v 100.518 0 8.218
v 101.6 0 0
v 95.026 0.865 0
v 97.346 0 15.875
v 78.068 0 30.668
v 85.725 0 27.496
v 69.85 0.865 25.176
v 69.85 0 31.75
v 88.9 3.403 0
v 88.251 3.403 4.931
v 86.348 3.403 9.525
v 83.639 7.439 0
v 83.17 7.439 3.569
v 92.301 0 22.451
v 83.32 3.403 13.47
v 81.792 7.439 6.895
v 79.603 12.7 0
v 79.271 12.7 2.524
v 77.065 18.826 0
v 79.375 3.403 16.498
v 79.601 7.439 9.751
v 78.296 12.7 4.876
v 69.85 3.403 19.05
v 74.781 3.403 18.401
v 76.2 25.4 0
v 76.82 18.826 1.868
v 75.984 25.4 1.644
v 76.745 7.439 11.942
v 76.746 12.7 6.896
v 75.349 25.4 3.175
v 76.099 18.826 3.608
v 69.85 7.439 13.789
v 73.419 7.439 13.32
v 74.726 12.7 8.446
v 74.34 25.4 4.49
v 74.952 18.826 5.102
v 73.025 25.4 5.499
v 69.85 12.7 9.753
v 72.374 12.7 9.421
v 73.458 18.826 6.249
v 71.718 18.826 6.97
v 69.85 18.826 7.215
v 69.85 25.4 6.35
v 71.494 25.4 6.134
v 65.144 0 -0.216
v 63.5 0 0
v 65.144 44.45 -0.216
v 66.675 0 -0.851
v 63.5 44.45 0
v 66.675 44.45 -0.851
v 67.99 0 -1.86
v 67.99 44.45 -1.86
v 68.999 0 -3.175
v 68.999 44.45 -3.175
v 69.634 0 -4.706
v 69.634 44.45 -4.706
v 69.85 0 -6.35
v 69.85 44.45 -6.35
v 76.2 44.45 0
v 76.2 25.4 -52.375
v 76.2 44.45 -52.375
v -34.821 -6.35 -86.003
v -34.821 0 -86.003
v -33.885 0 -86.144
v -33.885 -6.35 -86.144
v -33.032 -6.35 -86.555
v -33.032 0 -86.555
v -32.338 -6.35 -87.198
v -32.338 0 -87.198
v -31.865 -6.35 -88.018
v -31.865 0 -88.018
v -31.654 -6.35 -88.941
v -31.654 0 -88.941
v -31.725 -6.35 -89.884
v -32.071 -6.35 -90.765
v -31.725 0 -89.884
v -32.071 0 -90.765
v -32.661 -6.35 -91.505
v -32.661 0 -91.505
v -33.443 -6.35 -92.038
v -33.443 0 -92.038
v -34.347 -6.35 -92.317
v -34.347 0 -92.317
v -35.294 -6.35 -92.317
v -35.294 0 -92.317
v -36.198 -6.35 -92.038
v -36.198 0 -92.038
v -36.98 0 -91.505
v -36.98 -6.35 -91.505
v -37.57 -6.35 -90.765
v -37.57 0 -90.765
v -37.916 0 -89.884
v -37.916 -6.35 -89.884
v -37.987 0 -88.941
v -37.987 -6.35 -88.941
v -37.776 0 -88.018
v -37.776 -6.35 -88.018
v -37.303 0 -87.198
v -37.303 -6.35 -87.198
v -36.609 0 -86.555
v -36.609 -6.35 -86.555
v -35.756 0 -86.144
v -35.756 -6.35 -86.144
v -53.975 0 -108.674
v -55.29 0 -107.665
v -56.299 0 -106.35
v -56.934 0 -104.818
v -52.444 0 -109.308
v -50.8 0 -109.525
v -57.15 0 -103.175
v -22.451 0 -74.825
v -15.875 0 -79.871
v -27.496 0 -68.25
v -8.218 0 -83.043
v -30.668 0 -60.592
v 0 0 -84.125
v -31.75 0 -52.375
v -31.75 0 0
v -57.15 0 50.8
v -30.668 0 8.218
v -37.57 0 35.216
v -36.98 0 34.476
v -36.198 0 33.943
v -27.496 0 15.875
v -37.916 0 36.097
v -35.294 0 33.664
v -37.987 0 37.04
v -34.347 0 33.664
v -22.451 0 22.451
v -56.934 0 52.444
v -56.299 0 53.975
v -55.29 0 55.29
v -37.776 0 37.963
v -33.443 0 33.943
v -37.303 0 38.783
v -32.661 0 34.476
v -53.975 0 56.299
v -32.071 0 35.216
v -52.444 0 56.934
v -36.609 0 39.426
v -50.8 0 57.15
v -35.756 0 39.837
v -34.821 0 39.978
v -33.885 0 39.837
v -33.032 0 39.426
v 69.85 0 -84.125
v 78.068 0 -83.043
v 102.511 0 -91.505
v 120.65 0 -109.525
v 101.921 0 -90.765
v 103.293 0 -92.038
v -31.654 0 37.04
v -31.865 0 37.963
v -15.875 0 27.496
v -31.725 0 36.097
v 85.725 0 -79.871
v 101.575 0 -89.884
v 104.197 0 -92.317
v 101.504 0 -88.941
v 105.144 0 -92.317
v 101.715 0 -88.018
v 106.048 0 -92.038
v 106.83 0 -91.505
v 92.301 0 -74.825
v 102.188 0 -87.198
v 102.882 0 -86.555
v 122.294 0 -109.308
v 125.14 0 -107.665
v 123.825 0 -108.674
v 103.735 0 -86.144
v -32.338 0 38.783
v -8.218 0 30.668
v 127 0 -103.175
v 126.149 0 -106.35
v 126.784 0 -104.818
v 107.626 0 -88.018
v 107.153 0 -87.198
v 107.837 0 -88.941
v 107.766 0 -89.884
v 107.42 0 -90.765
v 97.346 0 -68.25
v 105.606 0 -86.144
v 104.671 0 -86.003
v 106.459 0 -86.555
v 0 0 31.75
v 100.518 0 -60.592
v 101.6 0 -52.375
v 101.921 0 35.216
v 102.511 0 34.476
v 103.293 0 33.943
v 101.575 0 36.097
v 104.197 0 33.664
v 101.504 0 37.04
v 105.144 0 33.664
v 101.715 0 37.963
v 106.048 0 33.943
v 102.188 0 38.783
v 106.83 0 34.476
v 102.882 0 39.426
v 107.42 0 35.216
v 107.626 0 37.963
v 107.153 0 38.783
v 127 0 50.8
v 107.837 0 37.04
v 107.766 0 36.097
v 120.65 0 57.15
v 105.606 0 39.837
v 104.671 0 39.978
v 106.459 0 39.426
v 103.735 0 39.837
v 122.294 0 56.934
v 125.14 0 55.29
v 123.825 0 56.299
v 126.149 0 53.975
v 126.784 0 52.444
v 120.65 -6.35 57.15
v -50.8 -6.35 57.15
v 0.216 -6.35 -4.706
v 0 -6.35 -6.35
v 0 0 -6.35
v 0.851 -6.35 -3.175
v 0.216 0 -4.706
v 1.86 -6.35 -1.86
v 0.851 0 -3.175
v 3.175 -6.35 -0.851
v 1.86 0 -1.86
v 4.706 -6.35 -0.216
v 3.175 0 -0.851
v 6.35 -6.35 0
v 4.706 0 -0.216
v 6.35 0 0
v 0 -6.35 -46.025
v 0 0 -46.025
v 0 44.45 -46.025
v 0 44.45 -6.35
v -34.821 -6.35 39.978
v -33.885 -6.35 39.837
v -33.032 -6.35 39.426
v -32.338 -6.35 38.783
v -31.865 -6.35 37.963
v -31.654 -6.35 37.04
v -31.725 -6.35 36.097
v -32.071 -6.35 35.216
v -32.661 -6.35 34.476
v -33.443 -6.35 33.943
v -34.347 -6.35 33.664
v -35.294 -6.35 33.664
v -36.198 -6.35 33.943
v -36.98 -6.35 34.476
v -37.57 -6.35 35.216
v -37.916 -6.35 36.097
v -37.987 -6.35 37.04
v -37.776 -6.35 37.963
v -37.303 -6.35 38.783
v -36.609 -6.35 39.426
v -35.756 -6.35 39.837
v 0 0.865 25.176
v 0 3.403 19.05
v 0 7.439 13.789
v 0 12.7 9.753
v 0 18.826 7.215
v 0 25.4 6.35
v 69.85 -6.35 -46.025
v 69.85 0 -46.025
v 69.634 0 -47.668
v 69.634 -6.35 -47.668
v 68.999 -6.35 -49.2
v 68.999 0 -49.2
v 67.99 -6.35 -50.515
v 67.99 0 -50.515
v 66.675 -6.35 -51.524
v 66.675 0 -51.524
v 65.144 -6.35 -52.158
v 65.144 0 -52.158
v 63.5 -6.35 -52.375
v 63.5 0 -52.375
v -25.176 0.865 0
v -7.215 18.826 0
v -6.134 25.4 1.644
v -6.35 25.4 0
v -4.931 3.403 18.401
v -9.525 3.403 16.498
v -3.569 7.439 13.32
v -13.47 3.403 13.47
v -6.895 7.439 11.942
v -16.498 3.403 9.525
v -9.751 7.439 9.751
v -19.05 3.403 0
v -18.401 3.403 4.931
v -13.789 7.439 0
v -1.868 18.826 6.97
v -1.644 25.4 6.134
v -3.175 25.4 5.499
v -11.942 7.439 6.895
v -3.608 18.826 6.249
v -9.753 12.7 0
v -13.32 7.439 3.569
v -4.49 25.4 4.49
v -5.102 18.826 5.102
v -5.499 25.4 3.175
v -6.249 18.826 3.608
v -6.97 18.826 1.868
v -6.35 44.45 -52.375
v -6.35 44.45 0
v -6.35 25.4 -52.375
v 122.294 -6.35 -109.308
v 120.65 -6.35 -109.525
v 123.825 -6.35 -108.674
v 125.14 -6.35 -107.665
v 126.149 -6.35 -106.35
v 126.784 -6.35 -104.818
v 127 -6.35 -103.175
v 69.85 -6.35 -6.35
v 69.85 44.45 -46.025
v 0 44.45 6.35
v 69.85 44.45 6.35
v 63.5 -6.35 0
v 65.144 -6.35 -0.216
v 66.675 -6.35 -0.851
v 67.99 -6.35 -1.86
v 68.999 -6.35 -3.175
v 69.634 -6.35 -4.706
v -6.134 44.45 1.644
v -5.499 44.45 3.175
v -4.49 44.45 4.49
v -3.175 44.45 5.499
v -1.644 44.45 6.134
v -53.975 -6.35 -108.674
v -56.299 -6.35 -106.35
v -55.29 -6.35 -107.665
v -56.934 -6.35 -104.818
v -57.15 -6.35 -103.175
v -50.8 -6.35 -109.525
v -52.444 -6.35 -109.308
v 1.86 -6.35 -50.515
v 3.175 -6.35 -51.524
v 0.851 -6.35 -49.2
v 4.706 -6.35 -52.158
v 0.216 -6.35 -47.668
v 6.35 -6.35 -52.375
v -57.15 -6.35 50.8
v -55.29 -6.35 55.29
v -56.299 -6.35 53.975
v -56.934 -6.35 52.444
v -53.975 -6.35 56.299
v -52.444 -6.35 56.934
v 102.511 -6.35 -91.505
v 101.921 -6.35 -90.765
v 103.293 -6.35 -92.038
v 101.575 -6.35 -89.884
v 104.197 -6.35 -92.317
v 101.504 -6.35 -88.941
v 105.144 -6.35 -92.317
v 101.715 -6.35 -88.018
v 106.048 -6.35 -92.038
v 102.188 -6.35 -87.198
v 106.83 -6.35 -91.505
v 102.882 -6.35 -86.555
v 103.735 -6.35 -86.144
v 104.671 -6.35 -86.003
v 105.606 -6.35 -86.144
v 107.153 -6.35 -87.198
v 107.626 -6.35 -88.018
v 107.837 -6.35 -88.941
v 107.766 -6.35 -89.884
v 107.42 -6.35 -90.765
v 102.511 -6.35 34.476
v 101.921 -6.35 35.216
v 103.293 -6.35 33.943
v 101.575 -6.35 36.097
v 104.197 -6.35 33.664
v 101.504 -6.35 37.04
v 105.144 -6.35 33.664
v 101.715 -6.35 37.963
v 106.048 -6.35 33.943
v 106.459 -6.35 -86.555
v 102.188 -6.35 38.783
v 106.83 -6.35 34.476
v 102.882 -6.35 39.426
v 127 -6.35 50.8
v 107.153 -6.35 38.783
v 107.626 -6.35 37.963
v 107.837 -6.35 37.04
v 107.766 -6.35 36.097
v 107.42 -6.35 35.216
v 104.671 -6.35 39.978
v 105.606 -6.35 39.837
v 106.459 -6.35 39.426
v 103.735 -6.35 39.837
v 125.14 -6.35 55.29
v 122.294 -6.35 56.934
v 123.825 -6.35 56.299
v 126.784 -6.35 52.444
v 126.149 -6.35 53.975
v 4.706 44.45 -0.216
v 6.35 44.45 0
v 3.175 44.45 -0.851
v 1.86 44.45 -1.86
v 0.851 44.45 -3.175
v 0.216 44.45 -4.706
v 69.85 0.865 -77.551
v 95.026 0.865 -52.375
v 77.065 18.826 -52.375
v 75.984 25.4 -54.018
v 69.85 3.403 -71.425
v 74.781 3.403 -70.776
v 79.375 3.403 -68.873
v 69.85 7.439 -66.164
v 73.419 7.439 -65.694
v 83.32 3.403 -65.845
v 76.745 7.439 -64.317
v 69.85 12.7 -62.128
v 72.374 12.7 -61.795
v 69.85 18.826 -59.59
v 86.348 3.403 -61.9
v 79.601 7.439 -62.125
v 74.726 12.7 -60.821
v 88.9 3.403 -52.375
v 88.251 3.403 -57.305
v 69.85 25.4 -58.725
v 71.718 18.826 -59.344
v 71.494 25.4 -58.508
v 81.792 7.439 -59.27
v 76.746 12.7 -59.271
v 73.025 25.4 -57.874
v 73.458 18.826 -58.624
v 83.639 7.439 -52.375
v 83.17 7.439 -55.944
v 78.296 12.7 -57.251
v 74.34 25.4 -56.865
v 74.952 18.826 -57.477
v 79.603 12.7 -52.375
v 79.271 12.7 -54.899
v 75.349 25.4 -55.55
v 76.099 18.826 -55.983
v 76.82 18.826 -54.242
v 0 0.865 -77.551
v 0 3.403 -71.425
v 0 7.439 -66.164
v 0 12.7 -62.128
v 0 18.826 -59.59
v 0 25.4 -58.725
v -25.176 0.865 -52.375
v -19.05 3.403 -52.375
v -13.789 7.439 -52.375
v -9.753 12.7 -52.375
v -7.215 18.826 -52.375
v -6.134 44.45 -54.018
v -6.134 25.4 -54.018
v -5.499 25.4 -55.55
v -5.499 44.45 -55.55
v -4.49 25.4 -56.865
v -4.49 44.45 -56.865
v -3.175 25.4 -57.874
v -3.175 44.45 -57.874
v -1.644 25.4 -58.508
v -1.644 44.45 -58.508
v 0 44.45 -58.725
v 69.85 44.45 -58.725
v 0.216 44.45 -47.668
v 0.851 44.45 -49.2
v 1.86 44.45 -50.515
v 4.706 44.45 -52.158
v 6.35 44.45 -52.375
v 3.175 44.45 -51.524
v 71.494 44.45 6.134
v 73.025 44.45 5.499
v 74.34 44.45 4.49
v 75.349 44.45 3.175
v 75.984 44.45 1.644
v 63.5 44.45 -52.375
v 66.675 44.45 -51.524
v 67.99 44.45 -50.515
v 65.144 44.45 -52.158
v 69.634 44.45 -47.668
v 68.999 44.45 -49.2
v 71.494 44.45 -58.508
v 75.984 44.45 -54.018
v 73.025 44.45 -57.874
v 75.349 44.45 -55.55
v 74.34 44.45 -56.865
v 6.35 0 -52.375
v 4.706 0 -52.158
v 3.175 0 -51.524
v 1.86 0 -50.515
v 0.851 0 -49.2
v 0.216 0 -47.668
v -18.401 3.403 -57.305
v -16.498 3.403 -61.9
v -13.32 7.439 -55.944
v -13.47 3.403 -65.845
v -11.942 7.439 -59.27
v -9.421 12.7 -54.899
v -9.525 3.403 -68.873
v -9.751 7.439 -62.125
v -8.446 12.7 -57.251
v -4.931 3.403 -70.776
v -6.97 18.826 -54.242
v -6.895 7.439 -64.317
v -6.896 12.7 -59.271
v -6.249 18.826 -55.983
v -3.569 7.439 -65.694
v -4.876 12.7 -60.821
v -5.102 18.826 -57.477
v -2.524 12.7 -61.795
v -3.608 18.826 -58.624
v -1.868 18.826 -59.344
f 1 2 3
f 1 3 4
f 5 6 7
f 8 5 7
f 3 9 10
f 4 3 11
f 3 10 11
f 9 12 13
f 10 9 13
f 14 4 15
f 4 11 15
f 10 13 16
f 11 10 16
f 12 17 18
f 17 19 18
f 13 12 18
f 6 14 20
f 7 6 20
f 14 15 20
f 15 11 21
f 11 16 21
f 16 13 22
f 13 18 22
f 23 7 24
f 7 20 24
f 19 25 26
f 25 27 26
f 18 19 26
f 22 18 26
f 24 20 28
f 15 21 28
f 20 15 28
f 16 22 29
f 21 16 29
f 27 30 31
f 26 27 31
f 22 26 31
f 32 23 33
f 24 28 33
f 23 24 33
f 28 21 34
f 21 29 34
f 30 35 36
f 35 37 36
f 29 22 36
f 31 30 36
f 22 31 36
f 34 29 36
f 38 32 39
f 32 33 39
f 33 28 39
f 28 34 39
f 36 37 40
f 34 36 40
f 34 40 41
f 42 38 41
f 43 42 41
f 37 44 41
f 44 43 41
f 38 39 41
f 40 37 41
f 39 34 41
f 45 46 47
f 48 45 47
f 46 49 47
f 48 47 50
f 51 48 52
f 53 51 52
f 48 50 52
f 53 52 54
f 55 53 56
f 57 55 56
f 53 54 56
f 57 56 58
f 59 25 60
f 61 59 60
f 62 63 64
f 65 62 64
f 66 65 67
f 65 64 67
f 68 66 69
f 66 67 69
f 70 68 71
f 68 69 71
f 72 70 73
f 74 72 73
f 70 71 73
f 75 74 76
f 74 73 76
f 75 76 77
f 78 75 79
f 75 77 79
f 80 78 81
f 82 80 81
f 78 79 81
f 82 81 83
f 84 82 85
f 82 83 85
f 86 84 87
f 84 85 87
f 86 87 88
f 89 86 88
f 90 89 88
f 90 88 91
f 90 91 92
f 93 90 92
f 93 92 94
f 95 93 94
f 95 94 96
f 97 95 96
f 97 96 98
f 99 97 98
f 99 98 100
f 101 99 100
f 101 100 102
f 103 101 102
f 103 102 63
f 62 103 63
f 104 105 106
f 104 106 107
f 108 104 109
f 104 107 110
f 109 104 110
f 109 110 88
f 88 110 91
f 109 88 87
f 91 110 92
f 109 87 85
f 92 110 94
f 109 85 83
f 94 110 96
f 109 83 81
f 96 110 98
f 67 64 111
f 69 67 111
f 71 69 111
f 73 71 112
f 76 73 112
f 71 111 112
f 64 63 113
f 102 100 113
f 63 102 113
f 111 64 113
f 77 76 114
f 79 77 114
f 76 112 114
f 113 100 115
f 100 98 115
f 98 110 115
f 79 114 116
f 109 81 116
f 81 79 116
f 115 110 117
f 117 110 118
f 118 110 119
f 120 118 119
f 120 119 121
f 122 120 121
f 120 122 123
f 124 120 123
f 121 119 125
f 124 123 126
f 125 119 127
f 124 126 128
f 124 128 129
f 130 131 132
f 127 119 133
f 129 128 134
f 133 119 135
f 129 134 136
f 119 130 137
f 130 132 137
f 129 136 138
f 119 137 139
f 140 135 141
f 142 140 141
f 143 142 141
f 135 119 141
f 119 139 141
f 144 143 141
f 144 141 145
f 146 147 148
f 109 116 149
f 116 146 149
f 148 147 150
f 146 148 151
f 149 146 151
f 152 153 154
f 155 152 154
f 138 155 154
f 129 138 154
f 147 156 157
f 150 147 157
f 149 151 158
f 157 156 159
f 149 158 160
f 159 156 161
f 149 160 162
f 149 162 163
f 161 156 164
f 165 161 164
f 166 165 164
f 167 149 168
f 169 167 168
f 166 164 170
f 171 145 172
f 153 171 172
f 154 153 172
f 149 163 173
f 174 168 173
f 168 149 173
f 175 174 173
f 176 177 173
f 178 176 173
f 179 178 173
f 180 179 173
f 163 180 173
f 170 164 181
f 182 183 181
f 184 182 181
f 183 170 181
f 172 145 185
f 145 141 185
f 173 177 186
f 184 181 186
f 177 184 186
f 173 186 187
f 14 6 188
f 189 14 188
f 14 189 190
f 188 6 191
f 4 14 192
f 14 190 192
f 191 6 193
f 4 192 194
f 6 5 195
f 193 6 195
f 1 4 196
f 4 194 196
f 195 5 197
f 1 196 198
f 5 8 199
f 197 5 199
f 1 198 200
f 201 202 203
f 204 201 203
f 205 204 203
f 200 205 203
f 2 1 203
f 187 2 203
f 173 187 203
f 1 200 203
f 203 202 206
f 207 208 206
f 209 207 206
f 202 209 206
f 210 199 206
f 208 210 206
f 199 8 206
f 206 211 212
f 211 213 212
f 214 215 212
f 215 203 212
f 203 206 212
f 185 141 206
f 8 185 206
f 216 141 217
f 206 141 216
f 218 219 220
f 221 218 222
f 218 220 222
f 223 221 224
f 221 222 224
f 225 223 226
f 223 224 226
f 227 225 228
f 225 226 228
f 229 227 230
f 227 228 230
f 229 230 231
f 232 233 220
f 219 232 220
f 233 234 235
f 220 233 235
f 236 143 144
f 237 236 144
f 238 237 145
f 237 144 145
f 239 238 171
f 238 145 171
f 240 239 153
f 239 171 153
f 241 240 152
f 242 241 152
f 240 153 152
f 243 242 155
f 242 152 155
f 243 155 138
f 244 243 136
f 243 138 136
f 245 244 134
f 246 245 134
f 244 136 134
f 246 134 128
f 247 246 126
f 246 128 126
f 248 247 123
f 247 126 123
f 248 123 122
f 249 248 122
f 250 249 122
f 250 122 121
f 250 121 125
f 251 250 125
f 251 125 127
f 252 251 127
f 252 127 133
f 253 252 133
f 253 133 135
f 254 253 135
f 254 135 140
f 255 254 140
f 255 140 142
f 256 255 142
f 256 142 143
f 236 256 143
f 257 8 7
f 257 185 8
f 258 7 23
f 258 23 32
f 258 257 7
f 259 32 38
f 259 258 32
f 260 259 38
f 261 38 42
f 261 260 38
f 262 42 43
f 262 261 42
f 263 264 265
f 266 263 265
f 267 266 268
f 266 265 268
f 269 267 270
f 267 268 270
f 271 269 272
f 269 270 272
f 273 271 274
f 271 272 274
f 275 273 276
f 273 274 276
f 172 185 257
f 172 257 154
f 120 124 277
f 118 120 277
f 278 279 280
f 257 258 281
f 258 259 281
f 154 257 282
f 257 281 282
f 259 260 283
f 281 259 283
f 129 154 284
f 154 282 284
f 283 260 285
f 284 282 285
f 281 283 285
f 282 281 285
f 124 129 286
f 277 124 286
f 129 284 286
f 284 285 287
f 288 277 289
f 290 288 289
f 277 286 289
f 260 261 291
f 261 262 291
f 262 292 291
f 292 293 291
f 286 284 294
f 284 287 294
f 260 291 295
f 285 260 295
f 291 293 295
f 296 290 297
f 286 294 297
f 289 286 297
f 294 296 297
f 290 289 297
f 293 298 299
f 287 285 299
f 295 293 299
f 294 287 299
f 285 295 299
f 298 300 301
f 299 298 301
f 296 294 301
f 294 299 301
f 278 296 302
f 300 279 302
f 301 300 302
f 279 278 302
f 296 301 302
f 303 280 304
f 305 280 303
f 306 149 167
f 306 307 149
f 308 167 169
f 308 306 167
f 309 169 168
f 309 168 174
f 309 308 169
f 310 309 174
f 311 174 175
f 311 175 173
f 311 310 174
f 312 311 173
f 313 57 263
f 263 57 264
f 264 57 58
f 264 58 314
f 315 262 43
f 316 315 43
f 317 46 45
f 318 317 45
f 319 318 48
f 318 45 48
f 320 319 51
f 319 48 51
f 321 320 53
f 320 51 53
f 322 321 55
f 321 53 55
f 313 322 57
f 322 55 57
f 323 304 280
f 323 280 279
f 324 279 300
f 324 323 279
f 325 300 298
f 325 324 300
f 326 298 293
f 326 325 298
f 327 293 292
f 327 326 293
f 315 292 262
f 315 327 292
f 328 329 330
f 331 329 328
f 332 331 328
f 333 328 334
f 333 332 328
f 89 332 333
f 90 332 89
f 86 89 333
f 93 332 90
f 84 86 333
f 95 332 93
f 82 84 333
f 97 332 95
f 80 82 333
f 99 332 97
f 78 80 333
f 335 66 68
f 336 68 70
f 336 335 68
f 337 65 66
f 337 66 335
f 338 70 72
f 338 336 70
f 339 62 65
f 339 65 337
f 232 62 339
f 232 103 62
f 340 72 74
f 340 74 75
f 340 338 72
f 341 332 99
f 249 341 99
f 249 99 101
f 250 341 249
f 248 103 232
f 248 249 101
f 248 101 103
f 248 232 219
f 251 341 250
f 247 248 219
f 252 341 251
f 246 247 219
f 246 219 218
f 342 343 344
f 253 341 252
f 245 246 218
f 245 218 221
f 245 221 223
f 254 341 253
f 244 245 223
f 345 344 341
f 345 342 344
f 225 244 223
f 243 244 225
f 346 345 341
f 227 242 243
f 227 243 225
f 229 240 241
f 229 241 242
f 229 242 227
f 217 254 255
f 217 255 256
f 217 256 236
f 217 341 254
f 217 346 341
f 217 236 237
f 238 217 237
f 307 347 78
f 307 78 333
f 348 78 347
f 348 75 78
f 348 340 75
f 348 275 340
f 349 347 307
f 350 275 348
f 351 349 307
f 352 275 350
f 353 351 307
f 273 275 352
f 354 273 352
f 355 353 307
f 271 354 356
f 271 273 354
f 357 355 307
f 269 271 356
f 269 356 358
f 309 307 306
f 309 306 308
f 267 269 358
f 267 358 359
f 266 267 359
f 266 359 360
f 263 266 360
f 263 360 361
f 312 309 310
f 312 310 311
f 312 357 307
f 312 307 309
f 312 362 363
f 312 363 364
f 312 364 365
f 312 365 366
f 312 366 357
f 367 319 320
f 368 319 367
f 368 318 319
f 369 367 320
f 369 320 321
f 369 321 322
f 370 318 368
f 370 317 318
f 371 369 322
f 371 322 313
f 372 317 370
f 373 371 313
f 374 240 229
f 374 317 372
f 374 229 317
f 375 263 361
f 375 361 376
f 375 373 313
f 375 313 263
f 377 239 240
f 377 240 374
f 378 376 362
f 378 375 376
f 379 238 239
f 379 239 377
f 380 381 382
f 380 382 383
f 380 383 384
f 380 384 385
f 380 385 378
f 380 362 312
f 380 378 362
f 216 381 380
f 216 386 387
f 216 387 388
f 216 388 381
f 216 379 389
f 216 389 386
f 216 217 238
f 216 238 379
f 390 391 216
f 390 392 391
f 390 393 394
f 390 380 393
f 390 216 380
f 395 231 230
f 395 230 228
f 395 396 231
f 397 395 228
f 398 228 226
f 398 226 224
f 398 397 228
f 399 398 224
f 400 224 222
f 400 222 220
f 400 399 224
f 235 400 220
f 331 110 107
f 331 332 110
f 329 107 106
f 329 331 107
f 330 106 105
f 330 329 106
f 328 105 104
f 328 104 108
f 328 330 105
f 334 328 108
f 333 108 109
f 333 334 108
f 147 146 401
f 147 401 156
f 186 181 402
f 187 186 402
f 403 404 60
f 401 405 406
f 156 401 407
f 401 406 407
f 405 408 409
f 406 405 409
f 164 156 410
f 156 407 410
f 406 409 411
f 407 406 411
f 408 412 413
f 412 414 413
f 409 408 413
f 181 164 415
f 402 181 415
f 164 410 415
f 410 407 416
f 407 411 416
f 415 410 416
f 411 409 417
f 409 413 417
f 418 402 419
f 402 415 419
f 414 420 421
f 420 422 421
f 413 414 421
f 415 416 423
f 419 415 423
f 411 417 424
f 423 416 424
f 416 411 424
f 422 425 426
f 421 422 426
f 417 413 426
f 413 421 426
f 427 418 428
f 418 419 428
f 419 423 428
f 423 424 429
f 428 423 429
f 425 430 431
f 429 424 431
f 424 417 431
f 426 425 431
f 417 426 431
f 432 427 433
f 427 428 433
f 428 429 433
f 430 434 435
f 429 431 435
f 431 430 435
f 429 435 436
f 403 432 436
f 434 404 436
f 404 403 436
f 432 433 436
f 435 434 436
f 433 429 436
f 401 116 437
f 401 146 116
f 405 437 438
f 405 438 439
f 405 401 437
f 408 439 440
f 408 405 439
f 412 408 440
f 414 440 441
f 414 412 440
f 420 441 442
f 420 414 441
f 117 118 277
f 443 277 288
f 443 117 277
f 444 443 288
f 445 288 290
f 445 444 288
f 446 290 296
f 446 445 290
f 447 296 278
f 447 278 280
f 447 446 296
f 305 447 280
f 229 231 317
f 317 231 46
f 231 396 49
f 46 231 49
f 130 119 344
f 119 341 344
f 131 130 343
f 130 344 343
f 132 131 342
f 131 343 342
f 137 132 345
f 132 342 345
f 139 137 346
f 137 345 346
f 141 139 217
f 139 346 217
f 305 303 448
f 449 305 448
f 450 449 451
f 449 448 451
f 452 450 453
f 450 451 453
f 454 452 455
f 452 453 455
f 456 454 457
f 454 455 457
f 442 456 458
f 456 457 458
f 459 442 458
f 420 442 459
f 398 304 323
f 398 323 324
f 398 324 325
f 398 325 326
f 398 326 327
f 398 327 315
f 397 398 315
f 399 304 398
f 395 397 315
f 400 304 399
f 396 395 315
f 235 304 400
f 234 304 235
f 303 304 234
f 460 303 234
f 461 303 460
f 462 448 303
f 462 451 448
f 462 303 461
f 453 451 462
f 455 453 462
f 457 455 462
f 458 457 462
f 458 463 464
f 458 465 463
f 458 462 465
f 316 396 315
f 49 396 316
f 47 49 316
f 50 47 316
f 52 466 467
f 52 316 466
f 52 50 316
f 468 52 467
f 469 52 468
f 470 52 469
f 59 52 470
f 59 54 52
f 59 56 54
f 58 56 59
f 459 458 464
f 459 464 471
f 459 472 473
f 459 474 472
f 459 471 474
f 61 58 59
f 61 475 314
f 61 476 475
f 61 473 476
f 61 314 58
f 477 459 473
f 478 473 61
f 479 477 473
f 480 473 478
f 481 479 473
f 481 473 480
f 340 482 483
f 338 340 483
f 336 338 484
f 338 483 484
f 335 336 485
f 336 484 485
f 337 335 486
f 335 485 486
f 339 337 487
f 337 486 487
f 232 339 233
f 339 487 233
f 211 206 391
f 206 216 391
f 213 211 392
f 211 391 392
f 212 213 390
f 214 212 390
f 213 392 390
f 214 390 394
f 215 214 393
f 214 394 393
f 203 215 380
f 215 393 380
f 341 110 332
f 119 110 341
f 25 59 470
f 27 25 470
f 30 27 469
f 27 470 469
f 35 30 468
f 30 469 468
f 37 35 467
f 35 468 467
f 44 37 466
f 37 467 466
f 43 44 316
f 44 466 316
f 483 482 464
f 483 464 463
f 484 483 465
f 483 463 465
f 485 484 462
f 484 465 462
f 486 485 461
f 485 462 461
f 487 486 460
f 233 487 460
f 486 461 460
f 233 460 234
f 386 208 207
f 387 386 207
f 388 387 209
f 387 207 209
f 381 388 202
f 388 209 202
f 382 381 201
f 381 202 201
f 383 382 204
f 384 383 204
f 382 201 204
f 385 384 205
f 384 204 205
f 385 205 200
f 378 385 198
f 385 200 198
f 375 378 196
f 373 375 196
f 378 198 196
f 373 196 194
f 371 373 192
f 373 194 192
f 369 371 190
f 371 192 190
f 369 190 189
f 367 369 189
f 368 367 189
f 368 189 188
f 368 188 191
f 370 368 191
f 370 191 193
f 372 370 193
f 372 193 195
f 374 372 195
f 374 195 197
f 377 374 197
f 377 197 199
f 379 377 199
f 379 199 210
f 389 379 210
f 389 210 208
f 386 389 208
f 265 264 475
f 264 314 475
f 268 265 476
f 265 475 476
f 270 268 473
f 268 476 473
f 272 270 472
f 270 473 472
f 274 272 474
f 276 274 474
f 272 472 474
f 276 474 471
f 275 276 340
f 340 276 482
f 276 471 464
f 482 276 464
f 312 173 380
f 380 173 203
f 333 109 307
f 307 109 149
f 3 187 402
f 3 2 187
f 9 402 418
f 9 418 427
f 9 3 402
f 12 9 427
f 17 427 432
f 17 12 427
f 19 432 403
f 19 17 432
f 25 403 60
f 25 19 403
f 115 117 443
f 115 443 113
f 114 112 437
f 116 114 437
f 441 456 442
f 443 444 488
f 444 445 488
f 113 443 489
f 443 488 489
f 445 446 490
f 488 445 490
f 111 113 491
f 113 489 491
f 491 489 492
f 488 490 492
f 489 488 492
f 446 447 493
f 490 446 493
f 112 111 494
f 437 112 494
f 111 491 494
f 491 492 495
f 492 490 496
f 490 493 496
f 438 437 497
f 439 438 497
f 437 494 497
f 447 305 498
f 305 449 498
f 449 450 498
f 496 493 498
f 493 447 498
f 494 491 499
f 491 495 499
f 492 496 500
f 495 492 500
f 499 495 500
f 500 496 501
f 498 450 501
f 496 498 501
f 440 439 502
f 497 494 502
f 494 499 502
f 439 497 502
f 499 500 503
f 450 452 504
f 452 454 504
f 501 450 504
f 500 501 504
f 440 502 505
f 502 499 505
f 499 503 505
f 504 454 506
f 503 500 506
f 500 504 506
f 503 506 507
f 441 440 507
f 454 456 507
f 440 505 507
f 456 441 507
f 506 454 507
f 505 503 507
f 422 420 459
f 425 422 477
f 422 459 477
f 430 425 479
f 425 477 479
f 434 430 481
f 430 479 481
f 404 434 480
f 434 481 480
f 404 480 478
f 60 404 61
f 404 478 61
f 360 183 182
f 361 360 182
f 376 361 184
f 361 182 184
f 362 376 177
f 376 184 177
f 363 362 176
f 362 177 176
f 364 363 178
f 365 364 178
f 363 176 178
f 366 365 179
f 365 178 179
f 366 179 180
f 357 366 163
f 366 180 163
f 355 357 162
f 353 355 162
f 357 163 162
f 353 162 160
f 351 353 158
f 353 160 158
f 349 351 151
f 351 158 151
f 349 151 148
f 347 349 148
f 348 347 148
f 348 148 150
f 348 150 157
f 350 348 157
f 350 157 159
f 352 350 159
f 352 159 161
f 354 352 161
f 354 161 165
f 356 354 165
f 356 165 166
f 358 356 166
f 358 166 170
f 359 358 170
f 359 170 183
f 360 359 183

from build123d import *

# Parameters (mm, degrees)
SKETCH1_W           = 82.55
SKETCH1_H           = 65.0748
SKETCH1_W_2         = 69.85
SKETCH1_H_2         = 52.3748
BOSS_EXTRUDE1_DEPTH = 44.45
SKETCH2_W           = 184.15
SKETCH2_H           = 166.6748
BOSS_EXTRUDE4_DEPTH = 6.35
FILLET2_R           = 6.35
SKETCH3_R           = 3.175
CUT_EXTRUDE1_DEPTH  = 174.494911496
FILLET4_R           = 25.4
CUT_EXTRUDE2_DEPTH  = 174.494911496


with BuildPart() as part:
    # Sketch1 → Boss-Extrude1 (new body)
    with BuildSketch(Plane(origin=(0, 0, 0), x_dir=(1, 0, 0), z_dir=(0, 1, 0))):
        with Locations((34.925, 26.1874)):
            Rectangle(SKETCH1_W, SKETCH1_H)
        with Locations((34.925, 26.1874)):
            Rectangle(SKETCH1_W_2, SKETCH1_H_2, mode=Mode.SUBTRACT)
    extrude(amount=BOSS_EXTRUDE1_DEPTH)

    # Sketch2 → Boss-Extrude4 (add)
    with BuildSketch(Plane.XZ):
        with Locations((34.925, -26.1874)):
            Rectangle(SKETCH2_W, SKETCH2_H)
    extrude(amount=BOSS_EXTRUDE4_DEPTH)

    # Fillet2
    fillet2_edges = [part.edges().sort_by_distance(p)[0] for p in [
        (0, 22.225, -52.3748),
        (0, 22.225, 0),
        (69.85, 22.225, 0),
        (69.85, 22.225, -52.3748),
        (-57.15, -3.175, 57.15),
        (-57.15, -3.175, -109.5248),
        (127, -3.175, -109.5248),
        (127, -3.175, 57.15),
        (-6.35, 22.225, -58.7248),
        (76.2, 22.225, -58.7248),
        (76.2, 22.225, 6.35),
        (-6.35, 22.225, 6.35),
    ]]
    fillet(fillet2_edges, radius=FILLET2_R)

    # Sketch3 → Cut-Extrude1 (cut, through all)
    with BuildSketch(Plane(origin=(0, 0, 0), x_dir=(1, 0, 0), z_dir=(0, 1, 0))):
        with Locations(Location((104.670538096, 89.177877977, 0), (0, 0, 270))):
            Circle(SKETCH3_R)
        with Locations(Location((-34.820538096, -36.803077977, 0), (0, 0, 270))):
            Circle(SKETCH3_R)
        with Locations(Location((104.670538096, -36.803077977, 0), (0, 0, 270))):
            Circle(SKETCH3_R)
        with Locations(Location((-34.820538096, 89.177877977, 0), (0, 0, 270))):
            Circle(SKETCH3_R)
    extrude(amount=-CUT_EXTRUDE1_DEPTH, mode=Mode.SUBTRACT)

    # Fillet4
    fillet4_edges = [part.edges().sort_by_distance(p)[0] for p in [
        (-6.35, 0, -26.1874),
        (34.925, 0, -58.7248),
        (76.2, 0, -26.1874),
        (34.925, 0, 6.35),
        (-4.490128061, 0, -56.864928061),
        (-4.490128061, 0, 4.490128061),
        (74.340128061, 0, -56.864928061),
        (74.340128061, 0, 4.490128061),
    ]]
    fillet(fillet4_edges, radius=FILLET4_R)

    # Sketch4 → Cut-Extrude2 (cut, through all)
    with BuildSketch(Plane(origin=(0, 0, 0), x_dir=(1, 0, 0), z_dir=(0, 1, 0))):
        with BuildLine():
            Line((0, 46.0248), (0, 6.35))
            ThreePointArc((0, 6.35), (1.859871939, 1.859871939), (6.35, 0))
            Line((6.35, 0), (63.5, 0))
            ThreePointArc((63.5, 0), (67.990128061, 1.859871939), (69.85, 6.35))
            Line((69.85, 6.35), (69.85, 46.0248))
            ThreePointArc((69.85, 46.0248), (67.990128061, 50.514928061), (63.5, 52.3748))
            Line((63.5, 52.3748), (6.35, 52.3748))
            ThreePointArc((6.35, 52.3748), (1.859871939, 50.514928061), (0, 46.0248))
        make_face()
    extrude(amount=-CUT_EXTRUDE2_DEPTH, mode=Mode.SUBTRACT)


solid = part.part
